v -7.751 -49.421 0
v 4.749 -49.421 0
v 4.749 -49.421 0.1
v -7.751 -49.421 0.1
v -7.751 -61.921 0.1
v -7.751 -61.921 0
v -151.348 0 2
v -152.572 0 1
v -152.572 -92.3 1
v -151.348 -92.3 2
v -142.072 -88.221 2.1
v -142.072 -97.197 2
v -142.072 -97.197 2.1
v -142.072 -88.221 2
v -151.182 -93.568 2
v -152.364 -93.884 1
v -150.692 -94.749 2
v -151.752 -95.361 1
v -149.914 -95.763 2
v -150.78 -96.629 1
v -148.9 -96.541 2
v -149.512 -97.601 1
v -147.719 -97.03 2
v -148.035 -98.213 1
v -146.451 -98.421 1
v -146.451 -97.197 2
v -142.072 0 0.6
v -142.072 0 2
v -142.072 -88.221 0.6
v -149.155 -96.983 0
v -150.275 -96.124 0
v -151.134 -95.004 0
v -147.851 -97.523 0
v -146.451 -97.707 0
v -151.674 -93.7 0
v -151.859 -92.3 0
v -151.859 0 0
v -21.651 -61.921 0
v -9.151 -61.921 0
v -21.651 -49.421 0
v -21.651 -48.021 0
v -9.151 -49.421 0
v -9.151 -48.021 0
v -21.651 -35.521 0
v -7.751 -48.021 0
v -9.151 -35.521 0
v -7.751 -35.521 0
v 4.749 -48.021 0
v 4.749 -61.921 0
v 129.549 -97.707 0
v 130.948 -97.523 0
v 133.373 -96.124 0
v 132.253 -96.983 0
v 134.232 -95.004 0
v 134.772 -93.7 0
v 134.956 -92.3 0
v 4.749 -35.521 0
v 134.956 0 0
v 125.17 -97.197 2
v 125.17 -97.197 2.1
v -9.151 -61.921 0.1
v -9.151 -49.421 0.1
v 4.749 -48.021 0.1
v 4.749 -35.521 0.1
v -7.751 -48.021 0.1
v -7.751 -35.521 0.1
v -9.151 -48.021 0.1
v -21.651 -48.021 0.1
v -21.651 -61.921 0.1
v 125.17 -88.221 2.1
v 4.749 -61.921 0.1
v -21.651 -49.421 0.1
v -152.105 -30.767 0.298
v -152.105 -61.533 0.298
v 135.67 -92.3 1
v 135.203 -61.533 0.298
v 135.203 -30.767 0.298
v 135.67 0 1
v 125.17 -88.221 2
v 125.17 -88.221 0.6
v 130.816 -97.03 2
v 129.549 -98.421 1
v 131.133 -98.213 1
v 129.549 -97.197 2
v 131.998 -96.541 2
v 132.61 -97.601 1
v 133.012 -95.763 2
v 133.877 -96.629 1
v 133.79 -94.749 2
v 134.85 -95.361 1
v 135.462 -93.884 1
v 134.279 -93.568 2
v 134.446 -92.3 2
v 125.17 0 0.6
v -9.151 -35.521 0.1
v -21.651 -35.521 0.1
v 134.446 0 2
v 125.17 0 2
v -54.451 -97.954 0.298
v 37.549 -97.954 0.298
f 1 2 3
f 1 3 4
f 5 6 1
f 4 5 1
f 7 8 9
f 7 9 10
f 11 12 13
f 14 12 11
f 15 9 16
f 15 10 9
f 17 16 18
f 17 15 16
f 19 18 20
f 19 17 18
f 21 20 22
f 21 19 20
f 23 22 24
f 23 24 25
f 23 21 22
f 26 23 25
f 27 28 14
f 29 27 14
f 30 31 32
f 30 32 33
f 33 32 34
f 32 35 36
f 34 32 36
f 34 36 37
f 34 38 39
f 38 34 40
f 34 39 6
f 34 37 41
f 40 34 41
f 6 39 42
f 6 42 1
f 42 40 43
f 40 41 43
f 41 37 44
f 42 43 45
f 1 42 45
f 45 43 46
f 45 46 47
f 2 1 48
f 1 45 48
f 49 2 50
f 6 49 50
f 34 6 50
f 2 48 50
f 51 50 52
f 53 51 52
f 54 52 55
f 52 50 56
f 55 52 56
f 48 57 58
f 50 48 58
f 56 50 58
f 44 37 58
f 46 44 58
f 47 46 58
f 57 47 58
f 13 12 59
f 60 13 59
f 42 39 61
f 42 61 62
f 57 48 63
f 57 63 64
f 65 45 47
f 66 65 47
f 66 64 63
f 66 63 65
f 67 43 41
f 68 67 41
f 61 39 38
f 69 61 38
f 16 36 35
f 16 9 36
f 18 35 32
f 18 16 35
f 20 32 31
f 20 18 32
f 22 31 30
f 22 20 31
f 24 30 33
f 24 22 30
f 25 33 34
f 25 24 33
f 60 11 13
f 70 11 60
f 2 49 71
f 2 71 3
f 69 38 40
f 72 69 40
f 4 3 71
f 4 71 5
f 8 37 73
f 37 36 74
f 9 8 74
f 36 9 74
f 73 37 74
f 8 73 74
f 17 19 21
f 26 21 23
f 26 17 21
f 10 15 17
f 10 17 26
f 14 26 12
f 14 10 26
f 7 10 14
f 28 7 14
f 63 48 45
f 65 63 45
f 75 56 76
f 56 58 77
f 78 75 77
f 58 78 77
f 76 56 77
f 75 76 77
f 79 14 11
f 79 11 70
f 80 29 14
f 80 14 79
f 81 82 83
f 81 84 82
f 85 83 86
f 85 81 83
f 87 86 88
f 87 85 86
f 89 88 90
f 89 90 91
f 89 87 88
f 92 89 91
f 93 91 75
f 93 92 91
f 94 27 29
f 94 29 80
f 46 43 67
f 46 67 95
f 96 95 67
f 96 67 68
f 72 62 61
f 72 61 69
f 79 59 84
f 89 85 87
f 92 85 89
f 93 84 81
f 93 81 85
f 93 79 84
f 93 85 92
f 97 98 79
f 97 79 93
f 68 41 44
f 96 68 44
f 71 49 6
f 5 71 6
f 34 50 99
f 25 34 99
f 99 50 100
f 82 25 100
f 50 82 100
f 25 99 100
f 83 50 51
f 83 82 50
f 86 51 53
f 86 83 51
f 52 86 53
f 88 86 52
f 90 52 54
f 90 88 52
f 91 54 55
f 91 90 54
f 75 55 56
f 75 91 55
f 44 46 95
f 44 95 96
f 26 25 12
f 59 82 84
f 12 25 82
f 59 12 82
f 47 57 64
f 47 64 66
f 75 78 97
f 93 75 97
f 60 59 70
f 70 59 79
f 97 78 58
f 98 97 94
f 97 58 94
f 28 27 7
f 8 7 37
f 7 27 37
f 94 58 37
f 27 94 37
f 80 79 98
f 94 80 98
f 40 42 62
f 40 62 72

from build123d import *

# Parameters (mm, degrees)
BOSS_EXTRU_1_DEPTH      = 2
ENL_V_MAT_EXTRU_1_DEPTH = 1.4
ESQUISSE10_W            = 267.242852503
ESQUISSE10_H            = 8.975920375
BOSS_EXTRU_3_DEPTH      = 0.1
ESQUISSE11_W            = 12.5
ESQUISSE11_H            = 12.5
ENL_V_MAT_EXTRU_2_DEPTH = 0.1


with BuildPart() as part:
    # Esquisse1 → Boss.-Extru.1 (new body)
    with BuildSketch(Plane.XY):
        with BuildLine():
            Line((-154.451069542, 0), (-154.451069542, -92.3))
            ThreePointArc((-154.451069542, -92.3), (-152.107923791, -97.956854249), (-146.451069542, -100.3))
            Line((-146.451069542, -100.3), (129.548930458, -100.3))
            ThreePointArc((129.548930458, -100.3), (135.205784708, -97.956854249), (137.548930458, -92.3))
            Line((137.548930458, -92.3), (137.548930458, 0))
            Line((137.548930458, 0), (-154.451069542, 0))
        make_face()
    extrude(amount=BOSS_EXTRU_1_DEPTH)

    # Enlèvement de matière-Balayage3: sweep along a path in Esquisse3
    with BuildLine(Plane(origin=(0, 0, 0), x_dir=(-1, 0, 0), z_dir=(0, 0, -1))) as enl_vement_de_mati_re_balayage3_path:
        Line((154.451069542, 0.2), (154.451069542, -92.3))
        ThreePointArc((154.451069542, -92.3), (152.107923791, -97.956854249), (146.451069542, -100.3))
        Line((146.451069542, -100.3), (-129.548930458, -100.3))
        ThreePointArc((-129.548930458, -100.3), (-135.205784708, -97.956854249), (-137.548930458, -92.3))
        Line((-137.548930458, -92.3), (-137.548930458, 0.2))
    # Esquisse9 → Enlèvement de matière-Balayage3 (sweep, cut)
    with BuildSketch(Plane(origin=(0, 0, 0), x_dir=(1, 0, 0), z_dir=(0, 1, 0))):
        with BuildLine():
            Line((135.67035671, -1), (134.446277084, -2))
            Line((134.446277084, -2), (136.182569378, -2))
            Line((136.182569378, -2), (147.673144552, -2))
            Line((147.673144552, -2), (147.673144552, 0))
            Line((147.673144552, 0), (134.956411872, 0))
            add(Edge.make_bspline(
                [(134.956411872, 0), (135.206323755, -0.279338228), (135.44542126, -0.617312994), (135.67035671, -1)],
                knots=[0, 0, 0, 0, 0.17887146, 0.17887146, 0.17887146, 0.17887146], degree=3))
        make_face()
    sweep(path=enl_vement_de_mati_re_balayage3_path.line, mode=Mode.SUBTRACT)

    # Esquisse5 → Enlèv. mat.-Extru.1 (cut)
    with BuildSketch(Plane.XY.offset(2)):
        with BuildLine():
            Line((124.926952048, -84.47802159), (124.926952048, 0))
            Line((124.926952048, 0), (-141.829091132, 0))
            Line((-141.829091132, 0), (-141.829091132, -84.47802159))
            ThreePointArc((-141.829091132, -84.47802159), (-140.950411475, -86.599341934), (-138.829091132, -87.47802159))
            Line((-138.829091132, -87.47802159), (121.926952048, -87.47802159))
            ThreePointArc((121.926952048, -87.47802159), (124.048272392, -86.599341934), (124.926952048, -84.47802159))
        make_face()
        with BuildLine():
            Line((-142.072495793, -88.221426251), (125.17035671, -88.221426251))
            Line((125.17035671, -88.221426251), (125.17035671, 0))
            Line((125.17035671, 0), (124.926952048, 0))
            Line((124.926952048, 0), (124.926952048, -84.47802159))
            ThreePointArc((124.926952048, -84.47802159), (124.048272392, -86.599341934), (121.926952048, -87.47802159))
            Line((121.926952048, -87.47802159), (-138.829091132, -87.47802159))
            ThreePointArc((-138.829091132, -87.47802159), (-140.950411475, -86.599341934), (-141.829091132, -84.47802159))
            Line((-141.829091132, -84.47802159), (-141.829091132, 0))
            Line((-141.829091132, 0), (-142.072495793, 0))
            Line((-142.072495793, 0), (-142.072495793, -88.221426251))
        make_face()
    extrude(amount=-ENL_V_MAT_EXTRU_1_DEPTH, mode=Mode.SUBTRACT)

    # Esquisse10 → Boss.-Extru.3 (add)
    with BuildSketch(Plane.XY.offset(2)):
        with Locations((-8.451069541, -92.709386439)):
            Rectangle(ESQUISSE10_W, ESQUISSE10_H)
    extrude(amount=BOSS_EXTRU_3_DEPTH)

    # Esquisse11 → Enlèv. mat.-Extru.2 (cut)
    with BuildSketch(Plane(origin=(0, 0, 0), x_dir=(-1, 0, 0), z_dir=(0, 0, -1))):
        with Locations((1.501069542, -55.671426251)):
            Rectangle(ESQUISSE11_W, ESQUISSE11_H)
        with Locations((1.501069542, -41.771426251)):
            Rectangle(ESQUISSE11_W, ESQUISSE11_H)
        with Locations((15.401069542, -41.771426251)):
            Rectangle(ESQUISSE11_W, ESQUISSE11_H)
        with Locations((15.401069542, -55.671426251)):
            Rectangle(ESQUISSE11_W, ESQUISSE11_H)
    extrude(amount=-ENL_V_MAT_EXTRU_2_DEPTH, mode=Mode.SUBTRACT)


solid = part.part
